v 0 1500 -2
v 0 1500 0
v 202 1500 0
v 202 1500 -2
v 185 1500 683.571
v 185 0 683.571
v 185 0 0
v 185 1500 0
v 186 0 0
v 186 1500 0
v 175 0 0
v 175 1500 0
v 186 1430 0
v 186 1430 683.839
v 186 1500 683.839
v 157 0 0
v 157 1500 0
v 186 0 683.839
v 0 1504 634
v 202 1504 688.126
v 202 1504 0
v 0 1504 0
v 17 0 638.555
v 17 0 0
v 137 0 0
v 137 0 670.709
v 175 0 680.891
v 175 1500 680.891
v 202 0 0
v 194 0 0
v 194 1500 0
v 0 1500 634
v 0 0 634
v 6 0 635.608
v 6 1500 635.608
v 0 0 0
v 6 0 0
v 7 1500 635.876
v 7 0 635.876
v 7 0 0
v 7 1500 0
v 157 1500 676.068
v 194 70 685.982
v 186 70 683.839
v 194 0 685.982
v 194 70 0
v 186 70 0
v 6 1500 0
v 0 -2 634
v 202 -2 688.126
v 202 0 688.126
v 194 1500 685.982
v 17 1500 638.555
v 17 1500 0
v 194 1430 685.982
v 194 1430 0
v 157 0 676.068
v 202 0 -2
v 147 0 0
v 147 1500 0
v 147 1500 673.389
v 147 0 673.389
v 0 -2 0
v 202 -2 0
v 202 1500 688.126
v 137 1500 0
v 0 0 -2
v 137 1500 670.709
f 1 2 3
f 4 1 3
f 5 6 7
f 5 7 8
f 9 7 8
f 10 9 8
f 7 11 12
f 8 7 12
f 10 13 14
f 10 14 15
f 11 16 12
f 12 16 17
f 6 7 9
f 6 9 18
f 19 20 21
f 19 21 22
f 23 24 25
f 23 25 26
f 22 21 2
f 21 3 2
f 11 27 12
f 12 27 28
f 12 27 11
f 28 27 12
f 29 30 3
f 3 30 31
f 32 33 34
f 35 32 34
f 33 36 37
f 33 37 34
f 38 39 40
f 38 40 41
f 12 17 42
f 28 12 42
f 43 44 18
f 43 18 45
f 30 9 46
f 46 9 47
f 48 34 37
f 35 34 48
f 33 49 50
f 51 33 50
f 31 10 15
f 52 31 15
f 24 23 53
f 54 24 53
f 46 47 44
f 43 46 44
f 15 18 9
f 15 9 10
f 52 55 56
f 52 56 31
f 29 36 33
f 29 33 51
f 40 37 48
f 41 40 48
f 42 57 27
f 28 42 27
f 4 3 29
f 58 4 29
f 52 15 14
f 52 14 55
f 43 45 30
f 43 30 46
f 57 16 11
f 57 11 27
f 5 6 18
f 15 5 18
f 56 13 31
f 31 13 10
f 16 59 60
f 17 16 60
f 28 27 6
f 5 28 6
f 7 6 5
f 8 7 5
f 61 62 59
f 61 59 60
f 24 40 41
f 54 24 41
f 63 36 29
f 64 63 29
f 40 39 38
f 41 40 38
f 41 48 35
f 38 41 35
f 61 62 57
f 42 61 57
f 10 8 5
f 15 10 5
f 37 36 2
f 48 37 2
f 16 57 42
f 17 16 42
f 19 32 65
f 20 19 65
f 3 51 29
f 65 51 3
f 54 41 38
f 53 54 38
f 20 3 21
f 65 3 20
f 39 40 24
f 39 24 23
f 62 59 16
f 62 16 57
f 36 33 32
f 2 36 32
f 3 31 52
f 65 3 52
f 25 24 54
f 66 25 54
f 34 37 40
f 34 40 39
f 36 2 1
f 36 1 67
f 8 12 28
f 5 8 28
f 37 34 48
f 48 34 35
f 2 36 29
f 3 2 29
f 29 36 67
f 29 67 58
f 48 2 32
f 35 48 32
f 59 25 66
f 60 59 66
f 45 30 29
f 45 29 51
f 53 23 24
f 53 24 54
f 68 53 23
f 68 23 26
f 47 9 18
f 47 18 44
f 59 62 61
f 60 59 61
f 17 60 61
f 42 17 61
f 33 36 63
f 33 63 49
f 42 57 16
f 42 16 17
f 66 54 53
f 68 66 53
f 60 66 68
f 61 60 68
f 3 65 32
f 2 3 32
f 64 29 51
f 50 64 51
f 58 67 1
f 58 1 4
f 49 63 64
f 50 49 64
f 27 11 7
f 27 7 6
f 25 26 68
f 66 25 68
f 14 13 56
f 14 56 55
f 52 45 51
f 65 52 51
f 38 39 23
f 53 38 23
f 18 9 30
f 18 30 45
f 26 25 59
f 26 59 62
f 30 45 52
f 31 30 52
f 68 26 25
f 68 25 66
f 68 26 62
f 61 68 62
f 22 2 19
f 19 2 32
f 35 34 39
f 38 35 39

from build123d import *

# Parameters (mm, degrees)
F0_W      = 1500
F0_H      = 700
F1_DEPTH  = 6
F2_DEPTH  = 1
F3_DEPTH  = 10
F4_DEPTH  = 120
F5_DEPTH  = 10
F6_DEPTH  = 10
F7_DEPTH  = 18
F8_DEPTH  = 10
F9_DEPTH  = 1
F10_W     = 70
F10_H     = 700
F11_DEPTH = 8
F12_W     = 1500
F12_H     = 700
F13_DEPTH = 8
F14_W     = 202
F14_H     = 700
F15_DEPTH = 2
F16_W     = 202
F16_H     = 1500
F17_DEPTH = 2
F18_W     = 202
F18_H     = 700
F19_DEPTH = 2
F20_DEPTH = 2
F22_DEPTH = 1506.001


with BuildPart() as f1:
    # F0 (on Right) → F1 (new body)
    with BuildSketch(Plane.YZ):
        with Locations((750, 350)):
            Rectangle(F0_W, F0_H)
    extrude(amount=F1_DEPTH)


with BuildPart() as f2:
    # F2 (new): a face of the model
    f2_faces = [f1.part.faces().sort_by_distance(p)[0] for p in [
        (6, 750, 350),
    ]]
    extrude(f2_faces, amount=F2_DEPTH)


with BuildPart() as f3:
    # F3 (new): a face of the model
    f3_faces = [f2.part.faces().sort_by_distance(p)[0] for p in [
        (7, 750, 350),
    ]]
    extrude(f3_faces, amount=F3_DEPTH)


with BuildPart() as f4:
    # F4 (new): a face of the model
    f4_faces = [f3.part.faces().sort_by_distance(p)[0] for p in [
        (17, 750, 350),
    ]]
    extrude(f4_faces, amount=F4_DEPTH)


with BuildPart() as f5:
    # F5 (new): a face of the model
    f5_faces = [f4.part.faces().sort_by_distance(p)[0] for p in [
        (137, 750, 350),
    ]]
    extrude(f5_faces, amount=F5_DEPTH)


with BuildPart() as f6:
    # F6 (new): a face of the model
    f6_faces = [f5.part.faces().sort_by_distance(p)[0] for p in [
        (147, 750, 350),
    ]]
    extrude(f6_faces, amount=F6_DEPTH)


with BuildPart() as f7:
    # F7 (new): a face of the model
    f7_faces = [f6.part.faces().sort_by_distance(p)[0] for p in [
        (157, 750, 350),
    ]]
    extrude(f7_faces, amount=F7_DEPTH)


with BuildPart() as f8:
    # F8 (new): a face of the model
    f8_faces = [f7.part.faces().sort_by_distance(p)[0] for p in [
        (175, 750, 350),
    ]]
    extrude(f8_faces, amount=F8_DEPTH)


with BuildPart() as f9:
    # F9 (new): a face of the model
    f9_faces = [f8.part.faces().sort_by_distance(p)[0] for p in [
        (185, 750, 350),
    ]]
    extrude(f9_faces, amount=F9_DEPTH)


with BuildPart() as f11:
    # F10 (on face) → F11 (new body)
    with BuildSketch(Plane.YZ.offset(186)):
        with Locations((35, 350)):
            Rectangle(F10_W, F10_H)
    extrude(amount=F11_DEPTH)


with BuildPart() as f11b:
    # F10 (on face) → F11, piece 2 (new body)
    with BuildSketch(Plane.YZ.offset(186)):
        with Locations((1465, 350)):
            Rectangle(F10_W, F10_H)
    extrude(amount=F11_DEPTH)


with BuildPart() as f13:
    # F12 (on face) → F13 (new body)
    with BuildSketch(Plane.YZ.offset(194)):
        with Locations((750, 350)):
            Rectangle(F12_W, F12_H)
    extrude(amount=F13_DEPTH)


with BuildPart() as f15:
    # F14 (on face) → F15 (new body)
    with BuildSketch(Plane.XZ):
        with Locations((101, 350)):
            Rectangle(F14_W, F14_H)
    extrude(amount=F15_DEPTH)


with BuildPart() as f17:
    # F16 (on face) → F17 (new body)
    with BuildSketch(Plane(origin=(0, 0, 0), x_dir=(1, 0, 0), z_dir=(0, 0, -1))):
        with Locations((101, -750)):
            Rectangle(F16_W, F16_H)
    extrude(amount=F17_DEPTH)


with BuildPart() as f19:
    # F18 (on face) → F19 (new body)
    with BuildSketch(Plane(origin=(0, 1500, 0), x_dir=(-1, 0, 0), z_dir=(0, 1, 0))):
        with Locations((-101, 350)):
            Rectangle(F18_W, F18_H)
    extrude(amount=F19_DEPTH)

    # F20 (add): a face of the model
    f20_faces = [f19.faces().sort_by_distance(p)[0] for p in [
        (101, 1502, 350),
    ]]
    extrude(f20_faces, amount=F20_DEPTH)


with BuildPart() as f22_tool:
    # F21 (on face) → F22 (new body, through all)
    with BuildSketch(Plane.XZ.offset(2)):
        Polygon((202, 688.1257368711), (202, 700), (0, 700), (0, 634), align=None)
    extrude(amount=-F22_DEPTH)


with BuildPart() as f1_1:
    add(f1.part)

    # F22: cut by f22_tool
    add(f22_tool.part, mode=Mode.SUBTRACT)


with BuildPart() as f2_1:
    add(f2.part)

    # F22: cut by f22_tool
    add(f22_tool.part, mode=Mode.SUBTRACT)


with BuildPart() as f3_1:
    add(f3.part)

    # F22: cut by f22_tool
    add(f22_tool.part, mode=Mode.SUBTRACT)


with BuildPart() as f4_1:
    add(f4.part)

    # F22: cut by f22_tool
    add(f22_tool.part, mode=Mode.SUBTRACT)


with BuildPart() as f5_1:
    add(f5.part)

    # F22: cut by f22_tool
    add(f22_tool.part, mode=Mode.SUBTRACT)


with BuildPart() as f6_1:
    add(f6.part)

    # F22: cut by f22_tool
    add(f22_tool.part, mode=Mode.SUBTRACT)


with BuildPart() as f7_1:
    add(f7.part)

    # F22: cut by f22_tool
    add(f22_tool.part, mode=Mode.SUBTRACT)


with BuildPart() as f8_1:
    add(f8.part)

    # F22: cut by f22_tool
    add(f22_tool.part, mode=Mode.SUBTRACT)


with BuildPart() as f9_1:
    add(f9.part)

    # F22: cut by f22_tool
    add(f22_tool.part, mode=Mode.SUBTRACT)


with BuildPart() as f11_1:
    add(f11.part)

    # F22: cut by f22_tool
    add(f22_tool.part, mode=Mode.SUBTRACT)


with BuildPart() as f11b_1:
    add(f11b.part)

    # F22: cut by f22_tool
    add(f22_tool.part, mode=Mode.SUBTRACT)


with BuildPart() as f13_1:
    add(f13.part)

    # F22: cut by f22_tool
    add(f22_tool.part, mode=Mode.SUBTRACT)


with BuildPart() as f15_1:
    add(f15.part)

    # F22: cut by f22_tool
    add(f22_tool.part, mode=Mode.SUBTRACT)


with BuildPart() as f19_1:
    add(f19.part)

    # F22: cut by f22_tool
    add(f22_tool.part, mode=Mode.SUBTRACT)


solid = Compound([f17.part, f1_1.part, f2_1.part, f3_1.part, f4_1.part, f5_1.part, f6_1.part, f7_1.part, f8_1.part, f9_1.part, f11_1.part, f11b_1.part, f13_1.part, f15_1.part, f19_1.part])
